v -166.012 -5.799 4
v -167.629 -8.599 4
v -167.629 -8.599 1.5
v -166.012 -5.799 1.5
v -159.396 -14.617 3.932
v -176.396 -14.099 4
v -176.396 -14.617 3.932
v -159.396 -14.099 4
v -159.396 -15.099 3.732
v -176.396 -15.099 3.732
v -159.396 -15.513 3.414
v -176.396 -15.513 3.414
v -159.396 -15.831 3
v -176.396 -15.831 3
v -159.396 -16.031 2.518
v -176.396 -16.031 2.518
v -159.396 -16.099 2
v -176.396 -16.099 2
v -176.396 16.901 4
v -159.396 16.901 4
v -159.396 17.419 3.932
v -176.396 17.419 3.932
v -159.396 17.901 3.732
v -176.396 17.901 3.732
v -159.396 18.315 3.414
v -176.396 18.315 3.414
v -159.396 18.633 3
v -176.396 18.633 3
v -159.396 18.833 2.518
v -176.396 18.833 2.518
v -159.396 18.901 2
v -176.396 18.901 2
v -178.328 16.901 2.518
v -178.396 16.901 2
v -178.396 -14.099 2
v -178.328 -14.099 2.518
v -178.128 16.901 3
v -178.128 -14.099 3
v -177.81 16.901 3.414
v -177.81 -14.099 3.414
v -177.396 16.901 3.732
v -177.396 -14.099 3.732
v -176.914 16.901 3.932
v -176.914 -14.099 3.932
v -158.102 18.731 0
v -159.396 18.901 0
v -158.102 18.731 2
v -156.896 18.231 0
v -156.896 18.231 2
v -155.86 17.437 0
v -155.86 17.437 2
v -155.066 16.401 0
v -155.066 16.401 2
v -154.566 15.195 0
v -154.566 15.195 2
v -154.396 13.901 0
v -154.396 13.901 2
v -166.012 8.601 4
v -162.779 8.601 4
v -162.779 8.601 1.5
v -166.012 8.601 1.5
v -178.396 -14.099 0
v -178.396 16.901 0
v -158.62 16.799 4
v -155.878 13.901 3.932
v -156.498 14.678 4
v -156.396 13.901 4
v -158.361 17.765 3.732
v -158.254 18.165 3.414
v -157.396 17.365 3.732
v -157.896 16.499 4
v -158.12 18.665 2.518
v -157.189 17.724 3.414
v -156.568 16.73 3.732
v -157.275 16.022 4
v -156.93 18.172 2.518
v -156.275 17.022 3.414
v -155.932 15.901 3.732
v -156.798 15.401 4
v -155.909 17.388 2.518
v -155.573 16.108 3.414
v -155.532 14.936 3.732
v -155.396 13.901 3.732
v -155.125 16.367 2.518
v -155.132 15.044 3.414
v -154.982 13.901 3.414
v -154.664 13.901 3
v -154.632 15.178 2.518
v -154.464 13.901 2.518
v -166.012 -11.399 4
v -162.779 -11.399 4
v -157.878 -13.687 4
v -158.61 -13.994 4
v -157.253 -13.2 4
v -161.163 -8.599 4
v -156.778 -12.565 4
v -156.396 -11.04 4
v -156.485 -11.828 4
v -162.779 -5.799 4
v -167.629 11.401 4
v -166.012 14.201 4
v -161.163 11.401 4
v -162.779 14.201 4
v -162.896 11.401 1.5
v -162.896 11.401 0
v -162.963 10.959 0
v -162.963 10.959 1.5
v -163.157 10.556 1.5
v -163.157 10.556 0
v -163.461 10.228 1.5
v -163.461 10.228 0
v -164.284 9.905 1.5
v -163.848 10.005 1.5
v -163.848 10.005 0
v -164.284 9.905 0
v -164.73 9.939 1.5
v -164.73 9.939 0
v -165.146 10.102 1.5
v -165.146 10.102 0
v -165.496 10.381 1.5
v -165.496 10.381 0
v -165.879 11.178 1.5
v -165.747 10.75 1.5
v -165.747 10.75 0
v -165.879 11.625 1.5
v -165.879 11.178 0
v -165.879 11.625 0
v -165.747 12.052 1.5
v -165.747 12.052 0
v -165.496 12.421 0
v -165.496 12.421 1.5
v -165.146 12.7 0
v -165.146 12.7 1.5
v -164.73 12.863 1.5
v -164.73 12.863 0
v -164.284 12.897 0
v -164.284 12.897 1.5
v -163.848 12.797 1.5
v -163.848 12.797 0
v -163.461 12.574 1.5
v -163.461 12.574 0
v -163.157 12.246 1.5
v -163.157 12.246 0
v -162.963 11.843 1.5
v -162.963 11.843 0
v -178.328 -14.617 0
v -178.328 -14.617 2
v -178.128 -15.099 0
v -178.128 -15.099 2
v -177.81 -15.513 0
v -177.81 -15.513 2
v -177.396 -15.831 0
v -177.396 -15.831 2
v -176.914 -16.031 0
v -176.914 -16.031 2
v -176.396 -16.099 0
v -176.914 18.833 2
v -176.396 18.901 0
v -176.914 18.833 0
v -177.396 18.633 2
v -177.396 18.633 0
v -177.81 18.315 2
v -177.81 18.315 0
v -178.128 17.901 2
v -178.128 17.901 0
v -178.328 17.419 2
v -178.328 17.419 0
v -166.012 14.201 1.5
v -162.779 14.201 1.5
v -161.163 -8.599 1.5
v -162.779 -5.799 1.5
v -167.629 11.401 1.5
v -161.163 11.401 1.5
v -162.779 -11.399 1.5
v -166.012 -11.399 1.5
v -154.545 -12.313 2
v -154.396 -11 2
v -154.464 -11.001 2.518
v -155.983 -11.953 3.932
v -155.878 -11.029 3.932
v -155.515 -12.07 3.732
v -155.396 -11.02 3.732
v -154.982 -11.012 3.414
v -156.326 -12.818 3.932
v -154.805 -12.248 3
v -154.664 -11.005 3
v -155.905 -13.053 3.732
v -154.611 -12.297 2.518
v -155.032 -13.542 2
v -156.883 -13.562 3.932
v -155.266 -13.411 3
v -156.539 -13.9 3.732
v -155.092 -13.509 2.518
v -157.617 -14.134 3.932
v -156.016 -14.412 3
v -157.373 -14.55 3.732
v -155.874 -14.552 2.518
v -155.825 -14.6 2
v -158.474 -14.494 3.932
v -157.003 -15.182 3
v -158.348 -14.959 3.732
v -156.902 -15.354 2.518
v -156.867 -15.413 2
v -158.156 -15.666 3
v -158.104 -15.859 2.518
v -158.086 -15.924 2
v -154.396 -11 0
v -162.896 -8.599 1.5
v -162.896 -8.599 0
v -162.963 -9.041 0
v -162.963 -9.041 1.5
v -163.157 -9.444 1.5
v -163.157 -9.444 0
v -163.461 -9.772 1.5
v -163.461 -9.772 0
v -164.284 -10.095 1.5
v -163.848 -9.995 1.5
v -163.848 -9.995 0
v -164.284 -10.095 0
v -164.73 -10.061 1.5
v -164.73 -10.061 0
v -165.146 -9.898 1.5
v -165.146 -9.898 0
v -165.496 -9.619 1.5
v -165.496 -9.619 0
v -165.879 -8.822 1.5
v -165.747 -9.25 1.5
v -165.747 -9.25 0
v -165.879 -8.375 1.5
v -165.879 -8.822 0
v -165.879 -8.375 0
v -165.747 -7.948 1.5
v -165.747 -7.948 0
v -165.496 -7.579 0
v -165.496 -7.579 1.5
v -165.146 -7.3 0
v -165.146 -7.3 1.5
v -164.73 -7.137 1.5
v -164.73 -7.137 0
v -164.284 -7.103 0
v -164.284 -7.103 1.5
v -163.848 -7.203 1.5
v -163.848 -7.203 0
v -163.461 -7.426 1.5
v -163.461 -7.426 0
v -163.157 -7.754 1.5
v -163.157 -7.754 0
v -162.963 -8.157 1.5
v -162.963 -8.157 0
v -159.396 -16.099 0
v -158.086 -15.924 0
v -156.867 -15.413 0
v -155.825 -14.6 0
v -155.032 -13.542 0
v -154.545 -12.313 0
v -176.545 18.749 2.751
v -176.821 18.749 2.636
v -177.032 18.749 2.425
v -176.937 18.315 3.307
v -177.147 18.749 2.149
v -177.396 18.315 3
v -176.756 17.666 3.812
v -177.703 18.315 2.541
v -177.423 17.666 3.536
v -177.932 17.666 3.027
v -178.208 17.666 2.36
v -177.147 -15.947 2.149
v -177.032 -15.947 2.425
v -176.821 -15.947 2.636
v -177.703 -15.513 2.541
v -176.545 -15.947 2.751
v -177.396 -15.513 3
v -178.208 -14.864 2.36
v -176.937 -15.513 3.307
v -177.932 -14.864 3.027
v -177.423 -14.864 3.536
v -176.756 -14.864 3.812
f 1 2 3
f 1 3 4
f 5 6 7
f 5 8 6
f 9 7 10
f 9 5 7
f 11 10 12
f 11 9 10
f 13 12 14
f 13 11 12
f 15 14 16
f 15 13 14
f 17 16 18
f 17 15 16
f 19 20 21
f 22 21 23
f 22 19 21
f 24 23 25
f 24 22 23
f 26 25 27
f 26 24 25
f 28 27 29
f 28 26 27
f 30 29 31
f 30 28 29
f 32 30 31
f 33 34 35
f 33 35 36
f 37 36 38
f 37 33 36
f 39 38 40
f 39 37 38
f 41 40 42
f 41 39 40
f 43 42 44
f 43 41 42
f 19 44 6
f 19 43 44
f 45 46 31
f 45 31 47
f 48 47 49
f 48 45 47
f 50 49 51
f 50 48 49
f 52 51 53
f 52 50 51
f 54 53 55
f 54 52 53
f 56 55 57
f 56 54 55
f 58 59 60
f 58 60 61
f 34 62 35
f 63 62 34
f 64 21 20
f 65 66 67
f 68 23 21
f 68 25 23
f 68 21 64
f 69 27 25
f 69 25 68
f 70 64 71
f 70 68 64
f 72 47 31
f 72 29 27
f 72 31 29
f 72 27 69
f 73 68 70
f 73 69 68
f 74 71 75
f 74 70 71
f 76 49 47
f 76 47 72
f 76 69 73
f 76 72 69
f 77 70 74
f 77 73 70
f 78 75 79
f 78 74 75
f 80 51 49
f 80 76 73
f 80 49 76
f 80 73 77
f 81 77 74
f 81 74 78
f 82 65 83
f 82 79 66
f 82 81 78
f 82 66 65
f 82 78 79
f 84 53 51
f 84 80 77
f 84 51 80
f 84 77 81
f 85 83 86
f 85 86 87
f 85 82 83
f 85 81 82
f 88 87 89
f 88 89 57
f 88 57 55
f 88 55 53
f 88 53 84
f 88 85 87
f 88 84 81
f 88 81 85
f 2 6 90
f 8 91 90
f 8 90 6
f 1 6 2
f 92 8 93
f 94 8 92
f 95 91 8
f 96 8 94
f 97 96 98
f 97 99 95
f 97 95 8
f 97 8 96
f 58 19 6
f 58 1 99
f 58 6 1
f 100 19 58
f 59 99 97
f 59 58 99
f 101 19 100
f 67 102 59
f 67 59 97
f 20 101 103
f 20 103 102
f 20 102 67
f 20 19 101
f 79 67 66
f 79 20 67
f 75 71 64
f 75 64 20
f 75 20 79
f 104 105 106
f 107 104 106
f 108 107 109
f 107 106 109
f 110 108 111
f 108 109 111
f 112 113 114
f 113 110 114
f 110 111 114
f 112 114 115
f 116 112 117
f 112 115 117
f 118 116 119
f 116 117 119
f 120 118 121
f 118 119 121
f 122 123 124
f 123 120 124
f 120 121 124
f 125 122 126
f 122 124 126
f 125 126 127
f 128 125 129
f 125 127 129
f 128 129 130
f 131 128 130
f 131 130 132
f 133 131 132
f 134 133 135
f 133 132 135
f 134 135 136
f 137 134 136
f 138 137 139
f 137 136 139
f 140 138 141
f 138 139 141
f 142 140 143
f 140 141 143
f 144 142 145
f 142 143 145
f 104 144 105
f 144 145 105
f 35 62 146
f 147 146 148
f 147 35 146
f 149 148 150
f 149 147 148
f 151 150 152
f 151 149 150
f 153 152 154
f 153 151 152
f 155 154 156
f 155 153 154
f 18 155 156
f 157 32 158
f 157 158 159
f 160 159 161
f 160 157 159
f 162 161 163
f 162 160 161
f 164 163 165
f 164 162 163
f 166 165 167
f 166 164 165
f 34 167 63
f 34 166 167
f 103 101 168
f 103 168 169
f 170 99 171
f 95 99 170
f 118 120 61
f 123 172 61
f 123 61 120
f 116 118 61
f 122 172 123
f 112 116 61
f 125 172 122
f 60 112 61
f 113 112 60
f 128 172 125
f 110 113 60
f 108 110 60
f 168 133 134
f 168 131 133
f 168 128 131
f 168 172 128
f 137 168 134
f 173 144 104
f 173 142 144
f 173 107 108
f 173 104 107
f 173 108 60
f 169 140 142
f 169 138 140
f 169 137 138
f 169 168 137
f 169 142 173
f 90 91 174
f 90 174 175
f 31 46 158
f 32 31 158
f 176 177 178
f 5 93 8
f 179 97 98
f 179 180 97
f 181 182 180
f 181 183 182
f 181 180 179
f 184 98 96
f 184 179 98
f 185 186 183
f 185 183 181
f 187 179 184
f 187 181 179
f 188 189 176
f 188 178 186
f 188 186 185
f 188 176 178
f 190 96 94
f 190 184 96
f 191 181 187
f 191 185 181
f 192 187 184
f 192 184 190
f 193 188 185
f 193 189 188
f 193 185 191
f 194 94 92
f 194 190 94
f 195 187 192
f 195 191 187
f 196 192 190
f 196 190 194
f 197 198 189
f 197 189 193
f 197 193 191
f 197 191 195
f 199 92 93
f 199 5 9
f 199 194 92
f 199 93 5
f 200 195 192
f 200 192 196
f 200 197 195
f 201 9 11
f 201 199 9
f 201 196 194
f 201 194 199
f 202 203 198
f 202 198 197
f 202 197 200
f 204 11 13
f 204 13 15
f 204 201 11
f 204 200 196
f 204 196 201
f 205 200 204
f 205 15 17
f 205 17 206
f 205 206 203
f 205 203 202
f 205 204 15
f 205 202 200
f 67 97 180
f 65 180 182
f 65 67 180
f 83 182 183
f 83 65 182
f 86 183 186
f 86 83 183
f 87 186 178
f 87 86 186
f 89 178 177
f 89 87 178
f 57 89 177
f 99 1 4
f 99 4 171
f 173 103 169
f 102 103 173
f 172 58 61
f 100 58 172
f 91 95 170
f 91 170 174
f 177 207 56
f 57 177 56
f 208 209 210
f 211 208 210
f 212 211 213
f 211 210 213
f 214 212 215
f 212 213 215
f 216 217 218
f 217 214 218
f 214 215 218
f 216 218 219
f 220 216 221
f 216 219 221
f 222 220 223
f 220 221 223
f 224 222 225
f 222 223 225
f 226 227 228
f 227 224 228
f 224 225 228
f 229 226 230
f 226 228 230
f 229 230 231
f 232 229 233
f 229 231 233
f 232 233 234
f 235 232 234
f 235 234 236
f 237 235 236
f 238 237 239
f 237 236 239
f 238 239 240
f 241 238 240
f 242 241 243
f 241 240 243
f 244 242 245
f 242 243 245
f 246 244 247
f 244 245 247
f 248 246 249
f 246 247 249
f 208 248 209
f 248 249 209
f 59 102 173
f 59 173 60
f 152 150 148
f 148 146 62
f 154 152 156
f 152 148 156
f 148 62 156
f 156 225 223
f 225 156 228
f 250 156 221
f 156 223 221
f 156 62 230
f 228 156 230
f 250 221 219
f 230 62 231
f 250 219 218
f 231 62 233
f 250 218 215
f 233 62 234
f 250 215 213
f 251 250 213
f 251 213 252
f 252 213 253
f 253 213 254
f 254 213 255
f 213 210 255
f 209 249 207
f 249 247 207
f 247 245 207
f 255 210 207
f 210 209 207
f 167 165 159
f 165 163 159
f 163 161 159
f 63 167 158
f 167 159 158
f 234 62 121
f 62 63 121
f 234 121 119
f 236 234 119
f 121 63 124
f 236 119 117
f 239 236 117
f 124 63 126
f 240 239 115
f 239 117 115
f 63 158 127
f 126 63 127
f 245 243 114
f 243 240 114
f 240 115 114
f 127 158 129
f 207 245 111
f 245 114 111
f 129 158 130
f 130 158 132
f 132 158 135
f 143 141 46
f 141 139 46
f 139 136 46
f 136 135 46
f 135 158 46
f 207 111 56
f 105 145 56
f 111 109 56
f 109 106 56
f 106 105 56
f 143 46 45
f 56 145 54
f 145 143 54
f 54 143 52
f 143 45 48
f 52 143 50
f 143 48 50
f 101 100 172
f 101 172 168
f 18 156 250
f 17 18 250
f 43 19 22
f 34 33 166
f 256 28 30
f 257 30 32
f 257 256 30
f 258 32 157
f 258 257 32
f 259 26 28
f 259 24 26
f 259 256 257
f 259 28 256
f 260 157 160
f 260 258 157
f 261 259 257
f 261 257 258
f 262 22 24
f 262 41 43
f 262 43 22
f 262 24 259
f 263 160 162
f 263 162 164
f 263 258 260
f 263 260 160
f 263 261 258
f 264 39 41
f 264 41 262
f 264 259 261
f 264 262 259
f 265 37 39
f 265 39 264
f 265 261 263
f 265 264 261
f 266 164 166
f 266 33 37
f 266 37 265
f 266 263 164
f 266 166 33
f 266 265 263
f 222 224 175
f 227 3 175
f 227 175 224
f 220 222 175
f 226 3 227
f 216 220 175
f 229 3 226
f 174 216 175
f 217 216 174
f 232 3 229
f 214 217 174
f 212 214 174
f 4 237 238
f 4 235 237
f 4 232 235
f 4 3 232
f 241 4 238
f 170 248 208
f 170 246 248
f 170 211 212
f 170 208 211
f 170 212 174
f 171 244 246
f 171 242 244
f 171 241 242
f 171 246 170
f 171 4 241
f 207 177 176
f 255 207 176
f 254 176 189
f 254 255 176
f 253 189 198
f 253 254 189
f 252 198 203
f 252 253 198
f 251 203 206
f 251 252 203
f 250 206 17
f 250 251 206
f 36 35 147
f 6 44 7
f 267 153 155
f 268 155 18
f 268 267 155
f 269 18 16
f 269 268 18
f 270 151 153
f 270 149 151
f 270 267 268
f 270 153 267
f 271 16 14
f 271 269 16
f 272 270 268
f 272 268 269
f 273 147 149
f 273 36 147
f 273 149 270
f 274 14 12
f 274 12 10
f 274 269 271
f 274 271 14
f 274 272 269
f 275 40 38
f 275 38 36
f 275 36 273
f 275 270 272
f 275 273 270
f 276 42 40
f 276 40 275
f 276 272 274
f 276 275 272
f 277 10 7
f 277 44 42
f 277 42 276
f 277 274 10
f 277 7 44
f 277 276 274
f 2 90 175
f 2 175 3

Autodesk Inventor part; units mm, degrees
ref_plane "YZ Plane" through (0, 0, 0) normal (1, 0, 0) x (0, 1, 0)
ref_plane "XZ Plane" through (0, 0, 0) normal (0, 1, 0) x (-1, 0, 0)
ref_plane "XY Plane" through (0, 0, 0) normal (0, 0, 1) x (1, 0, 0)
sketch "Эскиз1" plane through (0, 0, 0) normal (0, 0, 1) x (1, 0, 0)
  line L0 (-178.396, -16.0989) -> (-159.396, -16.0989)
  arc A0 (-159.396, -16.0989) -> (-154.396, -11) centre (-159.395, -11.0989) ccw
  line L1 (-154.396, -11) -> (-154.396, 13.9011)
  arc A1 (-154.396, 13.9011) -> (-159.396, 18.9011) centre (-159.396, 13.9011) ccw
  line L2 (-159.396, 18.9011) -> (-178.396, 18.9011)
  circle A2 centre (-164.396, 11.4011) radius 1.5
  circle A3 centre (-164.396, -8.5989) radius 1.5
  line L3 (-178.396, -16.0989) -> (-178.396, 18.9011)
  point P0 (0, 0)
  dimension "d9" = 20
  dimension "d10" = 7.5
  dimension "d11" = 7.5
  dimension "d12" = 14
  dimension "d13" = 10
  dimension "d14" = 5
  dimension "d15" = 5
  dimension "d16" = 14
  dimension "d17" = 3
  dimension "d18" = 3
extrude "Выдавливание1" add sketch "Эскиз1" along normal blind 4
sketch "Эскиз2" plane through (0, 0, 4) normal (0, 0, 1) x (1, 0, 0)
  circle A0 centre (-164.396, -8.5989) radius 1.5 projected
  circle A1 centre (-164.396, 11.4011) radius 1.5 projected
  line L0 (-178.396, -16.0989) -> (-159.396, -16.0989) projected
  arc A2 (-159.396, -16.0989) -> (-154.396, -11) centre (-159.395, -11.0989) ccw projected
  line L1 (-154.396, -11) -> (-154.396, 13.9011) projected
  arc A3 (-154.396, 13.9011) -> (-159.396, 18.9011) centre (-159.396, 13.9011) ccw projected
  line L2 (-159.396, 18.9011) -> (-178.396, 18.9011) projected
  line L3 (-178.396, 18.9011) -> (-178.396, -16.0989) projected
  circle A4 centre (-164.396, -8.5989) radius 1.5 projected
  line L4 (-167.6291, -8.5989) -> (-166.0125, -5.7989)
  line L5 (-166.0125, -5.7989) -> (-162.7794, -5.7989)
  line L6 (-162.7794, -5.7989) -> (-161.1628, -8.5989)
  line L7 (-161.1628, -8.5989) -> (-162.7794, -11.3989)
  line L8 (-162.7794, -11.3989) -> (-166.0125, -11.3989)
  line L9 (-166.0125, -11.3989) -> (-167.6291, -8.5989)
  line L10 (-167.6291, 11.4011) -> (-166.0125, 14.2011)
  line L11 (-166.0125, 14.2011) -> (-162.7794, 14.2011)
  line L12 (-162.7794, 14.2011) -> (-161.1628, 11.4011)
  line L13 (-161.1628, 11.4011) -> (-162.7794, 8.6011)
  line L14 (-162.7794, 8.6011) -> (-166.0125, 8.6011)
  line L15 (-166.0125, 8.6011) -> (-167.6291, 11.4011)
  line L16 (-159.396, 18.9011) -> (-178.396, 18.9011) projected
  line L17 (-178.396, -16.0989) -> (-159.396, -16.0989) projected
  point P0 (0, 0)
  point P1 (-164.396, 11.4011)
  dimension "d4" = 5.6
  dimension "d5" = 5.6
extrude "Выдавливание2" cut sketch "Эскиз2" against normal blind 2.5 contours L4 L5 L6 L7 L8 L9 | L10 L11 L12 L13 L14 L15
fillet "Сопряжение1" radius 2 8 edges at (-178.396, 1.4011, 4) (-155.825, -14.5996, 4) (-154.396, 1.4506, 4) (-155.8604, 17.4367, 4) (-168.896, 18.9011, 4) (-168.896, -16.0989, 4) (-178.396, -16.0989, 2) (-178.396, 18.9011, 2)
properties part number "крепление  магнитного замка"
